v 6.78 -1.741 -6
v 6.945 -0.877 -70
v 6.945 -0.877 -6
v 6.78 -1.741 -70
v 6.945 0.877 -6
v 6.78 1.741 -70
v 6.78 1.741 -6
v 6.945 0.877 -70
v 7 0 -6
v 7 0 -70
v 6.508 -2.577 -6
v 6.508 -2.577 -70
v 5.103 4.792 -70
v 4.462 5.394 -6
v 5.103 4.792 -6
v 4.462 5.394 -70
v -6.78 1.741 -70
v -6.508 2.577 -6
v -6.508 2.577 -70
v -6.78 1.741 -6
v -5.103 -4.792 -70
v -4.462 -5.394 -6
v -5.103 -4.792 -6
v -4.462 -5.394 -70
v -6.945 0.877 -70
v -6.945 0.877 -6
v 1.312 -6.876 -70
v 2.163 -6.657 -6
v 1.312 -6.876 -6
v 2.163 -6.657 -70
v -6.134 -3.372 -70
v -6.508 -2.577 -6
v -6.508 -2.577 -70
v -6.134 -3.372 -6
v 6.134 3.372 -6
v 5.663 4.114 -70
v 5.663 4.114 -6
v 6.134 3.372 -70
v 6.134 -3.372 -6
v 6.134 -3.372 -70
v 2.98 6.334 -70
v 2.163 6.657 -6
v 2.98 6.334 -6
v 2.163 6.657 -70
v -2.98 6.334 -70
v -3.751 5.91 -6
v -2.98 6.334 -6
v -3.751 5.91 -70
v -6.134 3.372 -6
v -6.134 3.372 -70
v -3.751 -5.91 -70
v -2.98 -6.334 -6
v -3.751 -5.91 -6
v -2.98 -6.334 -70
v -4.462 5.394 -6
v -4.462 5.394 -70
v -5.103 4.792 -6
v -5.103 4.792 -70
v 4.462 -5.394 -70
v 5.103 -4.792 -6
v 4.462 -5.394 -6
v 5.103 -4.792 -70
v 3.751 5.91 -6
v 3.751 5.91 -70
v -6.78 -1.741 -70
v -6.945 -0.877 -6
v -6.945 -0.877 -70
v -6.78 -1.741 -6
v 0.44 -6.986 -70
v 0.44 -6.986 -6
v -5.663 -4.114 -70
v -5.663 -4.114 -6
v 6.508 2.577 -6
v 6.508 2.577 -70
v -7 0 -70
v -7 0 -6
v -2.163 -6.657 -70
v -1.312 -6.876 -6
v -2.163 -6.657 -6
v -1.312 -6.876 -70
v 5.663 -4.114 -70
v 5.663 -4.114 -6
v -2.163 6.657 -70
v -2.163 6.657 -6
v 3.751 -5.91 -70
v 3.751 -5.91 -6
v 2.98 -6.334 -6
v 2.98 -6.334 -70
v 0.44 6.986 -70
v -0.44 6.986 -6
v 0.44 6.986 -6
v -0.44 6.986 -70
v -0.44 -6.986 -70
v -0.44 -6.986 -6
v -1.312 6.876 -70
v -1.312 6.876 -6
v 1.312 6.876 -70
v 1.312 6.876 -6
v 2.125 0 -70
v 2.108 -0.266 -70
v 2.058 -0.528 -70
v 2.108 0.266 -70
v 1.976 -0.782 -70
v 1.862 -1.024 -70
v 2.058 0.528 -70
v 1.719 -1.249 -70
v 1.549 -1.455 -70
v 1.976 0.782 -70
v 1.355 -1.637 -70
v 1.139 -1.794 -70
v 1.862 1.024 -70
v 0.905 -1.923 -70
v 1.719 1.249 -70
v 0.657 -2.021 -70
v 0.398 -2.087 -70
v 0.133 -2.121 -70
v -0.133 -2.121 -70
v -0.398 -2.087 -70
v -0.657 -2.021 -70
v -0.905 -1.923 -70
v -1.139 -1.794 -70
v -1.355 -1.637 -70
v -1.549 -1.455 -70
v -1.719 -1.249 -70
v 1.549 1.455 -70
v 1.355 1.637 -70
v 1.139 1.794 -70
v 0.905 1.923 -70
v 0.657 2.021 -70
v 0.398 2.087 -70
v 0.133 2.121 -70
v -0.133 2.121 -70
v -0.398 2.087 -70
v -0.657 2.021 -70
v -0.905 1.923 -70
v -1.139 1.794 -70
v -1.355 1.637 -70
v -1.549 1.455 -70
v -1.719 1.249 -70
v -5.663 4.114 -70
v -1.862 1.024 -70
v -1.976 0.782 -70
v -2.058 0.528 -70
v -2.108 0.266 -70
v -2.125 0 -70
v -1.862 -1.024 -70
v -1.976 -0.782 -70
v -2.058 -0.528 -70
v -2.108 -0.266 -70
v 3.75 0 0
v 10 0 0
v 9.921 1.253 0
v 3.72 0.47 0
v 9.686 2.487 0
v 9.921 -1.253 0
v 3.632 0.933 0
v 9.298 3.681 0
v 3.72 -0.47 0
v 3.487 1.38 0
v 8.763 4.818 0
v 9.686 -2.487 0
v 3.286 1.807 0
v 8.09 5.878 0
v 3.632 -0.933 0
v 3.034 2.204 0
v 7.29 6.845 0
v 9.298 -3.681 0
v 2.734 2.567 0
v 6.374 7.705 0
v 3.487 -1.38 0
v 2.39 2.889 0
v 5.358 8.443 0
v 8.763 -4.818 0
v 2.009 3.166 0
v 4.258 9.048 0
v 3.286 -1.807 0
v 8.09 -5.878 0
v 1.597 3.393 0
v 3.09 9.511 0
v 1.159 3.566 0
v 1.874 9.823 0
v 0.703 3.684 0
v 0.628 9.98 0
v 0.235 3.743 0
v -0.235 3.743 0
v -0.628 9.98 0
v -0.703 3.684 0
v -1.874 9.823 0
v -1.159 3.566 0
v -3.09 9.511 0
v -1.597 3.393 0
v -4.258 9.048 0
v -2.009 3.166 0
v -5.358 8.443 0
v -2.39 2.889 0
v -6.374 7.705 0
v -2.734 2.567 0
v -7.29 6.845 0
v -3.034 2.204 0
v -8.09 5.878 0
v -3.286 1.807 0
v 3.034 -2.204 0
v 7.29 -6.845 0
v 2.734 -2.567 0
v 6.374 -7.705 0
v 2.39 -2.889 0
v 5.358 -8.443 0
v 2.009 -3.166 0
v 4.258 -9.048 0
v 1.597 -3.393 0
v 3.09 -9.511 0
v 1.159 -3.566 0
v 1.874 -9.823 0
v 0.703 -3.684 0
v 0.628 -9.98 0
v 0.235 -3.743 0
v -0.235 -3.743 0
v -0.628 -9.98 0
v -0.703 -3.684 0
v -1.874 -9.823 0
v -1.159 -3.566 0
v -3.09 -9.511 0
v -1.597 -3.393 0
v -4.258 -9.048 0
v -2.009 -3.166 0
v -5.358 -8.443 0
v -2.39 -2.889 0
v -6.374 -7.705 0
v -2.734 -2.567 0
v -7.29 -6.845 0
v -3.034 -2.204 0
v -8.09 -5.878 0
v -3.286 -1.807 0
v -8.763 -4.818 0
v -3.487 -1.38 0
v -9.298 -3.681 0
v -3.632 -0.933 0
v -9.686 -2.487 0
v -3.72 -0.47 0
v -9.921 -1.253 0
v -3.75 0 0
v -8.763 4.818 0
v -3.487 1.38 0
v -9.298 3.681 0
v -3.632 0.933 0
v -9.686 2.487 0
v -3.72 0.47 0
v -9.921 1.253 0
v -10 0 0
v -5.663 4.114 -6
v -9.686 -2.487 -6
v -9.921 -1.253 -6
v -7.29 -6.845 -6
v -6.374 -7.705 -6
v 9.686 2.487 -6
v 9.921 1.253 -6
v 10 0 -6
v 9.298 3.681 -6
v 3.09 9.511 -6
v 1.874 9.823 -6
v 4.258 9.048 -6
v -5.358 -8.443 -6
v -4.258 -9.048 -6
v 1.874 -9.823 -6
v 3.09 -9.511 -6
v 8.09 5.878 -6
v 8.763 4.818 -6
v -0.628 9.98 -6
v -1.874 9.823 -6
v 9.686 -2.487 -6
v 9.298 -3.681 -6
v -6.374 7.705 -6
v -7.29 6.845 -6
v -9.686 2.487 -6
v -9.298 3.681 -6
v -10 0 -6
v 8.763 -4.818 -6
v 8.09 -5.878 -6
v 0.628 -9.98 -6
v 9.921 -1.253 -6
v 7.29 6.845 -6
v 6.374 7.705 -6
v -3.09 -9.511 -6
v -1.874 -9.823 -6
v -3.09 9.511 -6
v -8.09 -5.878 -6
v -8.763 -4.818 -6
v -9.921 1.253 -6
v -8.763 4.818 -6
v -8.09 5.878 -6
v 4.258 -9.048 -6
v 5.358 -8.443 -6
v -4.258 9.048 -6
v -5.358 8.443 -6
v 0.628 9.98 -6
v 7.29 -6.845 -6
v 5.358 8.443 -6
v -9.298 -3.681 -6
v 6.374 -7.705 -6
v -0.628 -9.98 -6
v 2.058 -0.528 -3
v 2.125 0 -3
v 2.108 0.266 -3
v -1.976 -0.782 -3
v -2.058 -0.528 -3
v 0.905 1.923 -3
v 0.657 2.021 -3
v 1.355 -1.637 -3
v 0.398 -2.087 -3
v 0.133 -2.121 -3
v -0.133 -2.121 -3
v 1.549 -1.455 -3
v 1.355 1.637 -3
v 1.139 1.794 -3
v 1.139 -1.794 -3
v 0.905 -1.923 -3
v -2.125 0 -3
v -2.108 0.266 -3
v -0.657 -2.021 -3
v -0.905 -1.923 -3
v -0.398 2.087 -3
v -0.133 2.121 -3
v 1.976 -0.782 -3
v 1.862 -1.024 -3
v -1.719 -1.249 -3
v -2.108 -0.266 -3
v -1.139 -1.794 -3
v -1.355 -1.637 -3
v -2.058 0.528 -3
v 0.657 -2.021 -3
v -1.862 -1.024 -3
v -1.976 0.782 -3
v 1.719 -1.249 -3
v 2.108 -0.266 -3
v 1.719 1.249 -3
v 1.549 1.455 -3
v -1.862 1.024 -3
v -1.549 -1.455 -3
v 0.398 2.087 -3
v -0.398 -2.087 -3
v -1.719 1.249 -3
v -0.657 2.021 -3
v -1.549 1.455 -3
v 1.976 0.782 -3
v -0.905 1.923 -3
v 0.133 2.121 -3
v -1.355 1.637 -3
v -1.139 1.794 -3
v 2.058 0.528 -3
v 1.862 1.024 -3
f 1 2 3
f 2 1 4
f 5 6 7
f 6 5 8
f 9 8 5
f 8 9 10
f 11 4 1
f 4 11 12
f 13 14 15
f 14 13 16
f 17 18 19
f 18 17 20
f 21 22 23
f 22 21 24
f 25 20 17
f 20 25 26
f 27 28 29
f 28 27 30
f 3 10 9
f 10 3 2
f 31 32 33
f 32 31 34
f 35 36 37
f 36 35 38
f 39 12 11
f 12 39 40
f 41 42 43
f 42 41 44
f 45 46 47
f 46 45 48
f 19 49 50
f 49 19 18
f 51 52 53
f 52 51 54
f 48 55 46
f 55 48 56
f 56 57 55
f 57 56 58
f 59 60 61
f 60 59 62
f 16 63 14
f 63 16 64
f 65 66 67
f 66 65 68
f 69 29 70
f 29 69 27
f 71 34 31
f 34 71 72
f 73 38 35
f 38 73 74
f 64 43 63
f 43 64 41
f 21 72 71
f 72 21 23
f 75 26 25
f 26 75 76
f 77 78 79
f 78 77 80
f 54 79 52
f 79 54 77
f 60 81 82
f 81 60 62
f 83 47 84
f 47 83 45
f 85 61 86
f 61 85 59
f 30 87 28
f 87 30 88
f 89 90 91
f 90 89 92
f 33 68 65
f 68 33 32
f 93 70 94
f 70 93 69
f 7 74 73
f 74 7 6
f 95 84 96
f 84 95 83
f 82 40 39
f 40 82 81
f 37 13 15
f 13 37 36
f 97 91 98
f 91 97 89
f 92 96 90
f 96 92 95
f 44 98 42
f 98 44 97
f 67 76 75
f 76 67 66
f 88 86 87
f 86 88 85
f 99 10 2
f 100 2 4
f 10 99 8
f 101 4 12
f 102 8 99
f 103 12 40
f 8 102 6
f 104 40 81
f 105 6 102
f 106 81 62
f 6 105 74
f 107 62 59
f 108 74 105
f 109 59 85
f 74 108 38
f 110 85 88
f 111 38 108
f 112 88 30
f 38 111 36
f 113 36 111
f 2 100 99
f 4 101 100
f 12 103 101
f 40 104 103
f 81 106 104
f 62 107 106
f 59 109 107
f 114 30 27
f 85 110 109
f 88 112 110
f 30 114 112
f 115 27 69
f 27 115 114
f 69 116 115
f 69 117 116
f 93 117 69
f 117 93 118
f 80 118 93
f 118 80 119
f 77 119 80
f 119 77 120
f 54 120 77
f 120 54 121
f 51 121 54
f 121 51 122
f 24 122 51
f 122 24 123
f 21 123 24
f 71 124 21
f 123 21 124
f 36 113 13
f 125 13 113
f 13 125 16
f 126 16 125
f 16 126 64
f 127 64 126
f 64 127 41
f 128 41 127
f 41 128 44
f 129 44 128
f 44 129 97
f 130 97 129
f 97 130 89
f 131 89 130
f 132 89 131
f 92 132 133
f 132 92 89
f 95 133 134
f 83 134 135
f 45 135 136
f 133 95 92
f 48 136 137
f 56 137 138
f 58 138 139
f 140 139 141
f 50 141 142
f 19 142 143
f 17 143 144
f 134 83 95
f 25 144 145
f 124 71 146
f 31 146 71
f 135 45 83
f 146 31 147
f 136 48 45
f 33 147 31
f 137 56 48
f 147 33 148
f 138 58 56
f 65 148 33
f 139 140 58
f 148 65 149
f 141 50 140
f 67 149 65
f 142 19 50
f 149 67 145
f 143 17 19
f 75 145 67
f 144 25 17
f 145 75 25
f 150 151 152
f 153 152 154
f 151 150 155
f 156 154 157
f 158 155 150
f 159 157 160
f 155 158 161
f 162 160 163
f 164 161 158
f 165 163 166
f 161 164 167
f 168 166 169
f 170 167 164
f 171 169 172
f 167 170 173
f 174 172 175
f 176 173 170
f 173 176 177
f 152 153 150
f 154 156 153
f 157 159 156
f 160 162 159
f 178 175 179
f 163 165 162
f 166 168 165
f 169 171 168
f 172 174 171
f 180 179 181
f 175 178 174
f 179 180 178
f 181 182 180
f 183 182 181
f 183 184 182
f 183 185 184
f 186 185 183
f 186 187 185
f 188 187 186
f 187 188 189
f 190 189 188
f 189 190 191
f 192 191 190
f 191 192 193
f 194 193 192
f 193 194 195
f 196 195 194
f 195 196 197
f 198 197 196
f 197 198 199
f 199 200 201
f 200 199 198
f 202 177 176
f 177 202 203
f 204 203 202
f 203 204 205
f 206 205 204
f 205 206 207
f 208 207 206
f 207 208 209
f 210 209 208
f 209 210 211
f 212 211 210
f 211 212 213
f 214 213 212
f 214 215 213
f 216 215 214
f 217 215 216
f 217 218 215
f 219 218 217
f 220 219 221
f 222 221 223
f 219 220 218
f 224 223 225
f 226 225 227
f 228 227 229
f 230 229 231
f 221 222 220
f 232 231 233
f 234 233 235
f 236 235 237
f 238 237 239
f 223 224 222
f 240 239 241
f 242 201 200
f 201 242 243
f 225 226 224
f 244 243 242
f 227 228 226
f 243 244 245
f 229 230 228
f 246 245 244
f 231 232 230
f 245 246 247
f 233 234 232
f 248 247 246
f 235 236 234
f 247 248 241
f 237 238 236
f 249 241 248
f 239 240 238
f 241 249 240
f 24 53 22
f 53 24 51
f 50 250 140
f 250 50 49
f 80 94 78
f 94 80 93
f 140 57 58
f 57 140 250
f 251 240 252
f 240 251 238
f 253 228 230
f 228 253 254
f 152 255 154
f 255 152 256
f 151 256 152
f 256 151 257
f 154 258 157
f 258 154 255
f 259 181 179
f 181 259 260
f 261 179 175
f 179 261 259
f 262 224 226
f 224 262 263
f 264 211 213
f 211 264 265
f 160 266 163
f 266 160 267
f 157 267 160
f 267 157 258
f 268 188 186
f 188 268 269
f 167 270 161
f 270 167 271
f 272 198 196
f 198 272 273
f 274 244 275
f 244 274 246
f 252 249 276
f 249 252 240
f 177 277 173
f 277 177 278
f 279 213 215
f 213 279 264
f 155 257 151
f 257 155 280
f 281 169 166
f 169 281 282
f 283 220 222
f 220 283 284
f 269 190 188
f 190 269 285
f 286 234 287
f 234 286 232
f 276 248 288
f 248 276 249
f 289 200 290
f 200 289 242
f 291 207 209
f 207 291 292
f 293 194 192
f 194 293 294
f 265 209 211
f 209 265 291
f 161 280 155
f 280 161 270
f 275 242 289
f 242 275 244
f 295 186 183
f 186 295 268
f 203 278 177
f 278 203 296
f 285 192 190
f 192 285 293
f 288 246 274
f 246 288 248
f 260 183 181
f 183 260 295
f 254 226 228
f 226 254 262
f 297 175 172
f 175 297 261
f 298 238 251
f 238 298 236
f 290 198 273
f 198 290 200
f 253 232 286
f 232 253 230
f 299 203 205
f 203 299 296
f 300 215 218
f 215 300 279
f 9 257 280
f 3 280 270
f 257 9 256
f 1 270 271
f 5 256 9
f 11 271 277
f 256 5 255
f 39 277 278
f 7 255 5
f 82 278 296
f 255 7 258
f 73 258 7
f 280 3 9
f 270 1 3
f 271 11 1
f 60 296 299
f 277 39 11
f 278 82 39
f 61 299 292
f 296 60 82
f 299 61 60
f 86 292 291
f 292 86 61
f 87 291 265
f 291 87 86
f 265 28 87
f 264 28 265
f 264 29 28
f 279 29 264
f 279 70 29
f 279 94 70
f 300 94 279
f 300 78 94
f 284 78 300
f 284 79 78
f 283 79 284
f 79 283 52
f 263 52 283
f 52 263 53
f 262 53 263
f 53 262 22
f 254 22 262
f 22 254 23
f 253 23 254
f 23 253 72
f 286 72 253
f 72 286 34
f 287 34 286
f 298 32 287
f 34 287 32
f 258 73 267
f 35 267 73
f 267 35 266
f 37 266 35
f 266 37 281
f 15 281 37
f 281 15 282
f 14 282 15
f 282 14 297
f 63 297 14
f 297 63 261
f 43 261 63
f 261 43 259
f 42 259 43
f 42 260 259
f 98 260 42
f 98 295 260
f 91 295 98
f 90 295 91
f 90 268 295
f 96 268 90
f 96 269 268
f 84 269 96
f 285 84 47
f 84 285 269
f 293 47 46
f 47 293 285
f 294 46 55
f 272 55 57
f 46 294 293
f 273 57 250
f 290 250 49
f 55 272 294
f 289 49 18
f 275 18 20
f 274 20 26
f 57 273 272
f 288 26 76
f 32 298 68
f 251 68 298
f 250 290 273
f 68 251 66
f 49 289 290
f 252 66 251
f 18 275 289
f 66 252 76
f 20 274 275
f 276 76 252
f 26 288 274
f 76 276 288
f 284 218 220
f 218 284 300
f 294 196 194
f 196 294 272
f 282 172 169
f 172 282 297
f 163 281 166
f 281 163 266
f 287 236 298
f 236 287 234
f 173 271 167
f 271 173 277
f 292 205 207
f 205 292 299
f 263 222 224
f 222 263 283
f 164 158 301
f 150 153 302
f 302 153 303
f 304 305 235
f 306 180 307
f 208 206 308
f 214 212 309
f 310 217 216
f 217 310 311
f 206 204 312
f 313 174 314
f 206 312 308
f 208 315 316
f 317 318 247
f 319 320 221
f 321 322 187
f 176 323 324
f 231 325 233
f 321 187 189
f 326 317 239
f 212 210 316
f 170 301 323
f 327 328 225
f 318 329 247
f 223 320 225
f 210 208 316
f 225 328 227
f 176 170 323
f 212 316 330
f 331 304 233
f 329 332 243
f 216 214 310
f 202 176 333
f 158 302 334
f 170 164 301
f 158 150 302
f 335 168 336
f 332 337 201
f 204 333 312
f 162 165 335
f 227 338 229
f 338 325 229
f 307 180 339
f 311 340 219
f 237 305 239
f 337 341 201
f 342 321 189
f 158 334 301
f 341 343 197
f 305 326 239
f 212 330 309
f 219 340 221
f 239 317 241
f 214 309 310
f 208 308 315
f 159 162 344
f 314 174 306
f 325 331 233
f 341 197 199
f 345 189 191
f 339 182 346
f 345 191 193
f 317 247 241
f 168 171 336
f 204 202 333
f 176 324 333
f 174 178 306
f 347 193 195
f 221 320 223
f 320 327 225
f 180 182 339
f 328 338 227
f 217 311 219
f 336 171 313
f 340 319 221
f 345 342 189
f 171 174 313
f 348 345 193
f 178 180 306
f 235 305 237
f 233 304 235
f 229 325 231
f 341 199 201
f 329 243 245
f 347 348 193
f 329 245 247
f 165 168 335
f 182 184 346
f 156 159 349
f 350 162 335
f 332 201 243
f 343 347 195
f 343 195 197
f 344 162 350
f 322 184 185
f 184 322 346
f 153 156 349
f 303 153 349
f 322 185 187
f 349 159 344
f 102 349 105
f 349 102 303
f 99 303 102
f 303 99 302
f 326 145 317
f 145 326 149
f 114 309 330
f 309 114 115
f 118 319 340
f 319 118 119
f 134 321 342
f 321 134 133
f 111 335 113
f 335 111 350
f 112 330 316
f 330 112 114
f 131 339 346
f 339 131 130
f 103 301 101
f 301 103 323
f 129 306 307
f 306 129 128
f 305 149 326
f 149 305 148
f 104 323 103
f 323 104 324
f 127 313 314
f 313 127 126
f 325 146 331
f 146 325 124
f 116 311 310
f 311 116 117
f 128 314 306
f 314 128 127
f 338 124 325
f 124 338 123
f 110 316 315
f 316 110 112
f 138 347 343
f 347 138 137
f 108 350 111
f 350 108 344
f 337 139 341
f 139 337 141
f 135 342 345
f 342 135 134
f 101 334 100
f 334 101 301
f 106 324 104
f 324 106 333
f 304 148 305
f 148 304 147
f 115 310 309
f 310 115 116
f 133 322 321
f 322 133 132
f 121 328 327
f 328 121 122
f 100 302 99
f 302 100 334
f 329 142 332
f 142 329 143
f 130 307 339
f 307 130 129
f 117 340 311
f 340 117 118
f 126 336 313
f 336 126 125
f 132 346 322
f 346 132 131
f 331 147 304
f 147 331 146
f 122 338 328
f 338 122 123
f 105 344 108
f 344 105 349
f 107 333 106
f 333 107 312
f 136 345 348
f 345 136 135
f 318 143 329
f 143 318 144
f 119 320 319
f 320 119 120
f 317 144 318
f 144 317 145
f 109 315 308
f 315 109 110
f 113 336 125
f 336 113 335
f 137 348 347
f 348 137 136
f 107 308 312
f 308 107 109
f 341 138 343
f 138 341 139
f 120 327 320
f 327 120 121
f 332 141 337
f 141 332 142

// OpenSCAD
$fn = 50;


difference() {
	union() {
		translate(v = [0, 0, -70.0000000000]) {
			cylinder(h = 70, r = 7.0000000000);
		}
		translate(v = [0, 0, -6.0000000000]) {
			cylinder(h = 6, r = 10.0000000000);
		}
	}
	union() {
		translate(v = [0, 0, 0]) {
			rotate(a = [0, 0, 0]) {
				difference() {
					union() {
						#translate(v = [0, 0, -70.0000000000]) {
							cylinder(h = 70, r = 2.0000000000);
						}
						#translate(v = [0, 0, -3]) {
							cylinder(h = 3, r = 7.0000000000, r1 = 2.1250000000, r2 = 3.7500000000);
						}
						#translate(v = [0, 0, -70.0000000000]) {
							cylinder(h = 70, r = 2.1250000000);
						}
						#translate(v = [0, 0, -70.0000000000]) {
							cylinder(h = 70, r = 2.0000000000);
						}
					}
					union();
				}
			}
		}
	}
}
